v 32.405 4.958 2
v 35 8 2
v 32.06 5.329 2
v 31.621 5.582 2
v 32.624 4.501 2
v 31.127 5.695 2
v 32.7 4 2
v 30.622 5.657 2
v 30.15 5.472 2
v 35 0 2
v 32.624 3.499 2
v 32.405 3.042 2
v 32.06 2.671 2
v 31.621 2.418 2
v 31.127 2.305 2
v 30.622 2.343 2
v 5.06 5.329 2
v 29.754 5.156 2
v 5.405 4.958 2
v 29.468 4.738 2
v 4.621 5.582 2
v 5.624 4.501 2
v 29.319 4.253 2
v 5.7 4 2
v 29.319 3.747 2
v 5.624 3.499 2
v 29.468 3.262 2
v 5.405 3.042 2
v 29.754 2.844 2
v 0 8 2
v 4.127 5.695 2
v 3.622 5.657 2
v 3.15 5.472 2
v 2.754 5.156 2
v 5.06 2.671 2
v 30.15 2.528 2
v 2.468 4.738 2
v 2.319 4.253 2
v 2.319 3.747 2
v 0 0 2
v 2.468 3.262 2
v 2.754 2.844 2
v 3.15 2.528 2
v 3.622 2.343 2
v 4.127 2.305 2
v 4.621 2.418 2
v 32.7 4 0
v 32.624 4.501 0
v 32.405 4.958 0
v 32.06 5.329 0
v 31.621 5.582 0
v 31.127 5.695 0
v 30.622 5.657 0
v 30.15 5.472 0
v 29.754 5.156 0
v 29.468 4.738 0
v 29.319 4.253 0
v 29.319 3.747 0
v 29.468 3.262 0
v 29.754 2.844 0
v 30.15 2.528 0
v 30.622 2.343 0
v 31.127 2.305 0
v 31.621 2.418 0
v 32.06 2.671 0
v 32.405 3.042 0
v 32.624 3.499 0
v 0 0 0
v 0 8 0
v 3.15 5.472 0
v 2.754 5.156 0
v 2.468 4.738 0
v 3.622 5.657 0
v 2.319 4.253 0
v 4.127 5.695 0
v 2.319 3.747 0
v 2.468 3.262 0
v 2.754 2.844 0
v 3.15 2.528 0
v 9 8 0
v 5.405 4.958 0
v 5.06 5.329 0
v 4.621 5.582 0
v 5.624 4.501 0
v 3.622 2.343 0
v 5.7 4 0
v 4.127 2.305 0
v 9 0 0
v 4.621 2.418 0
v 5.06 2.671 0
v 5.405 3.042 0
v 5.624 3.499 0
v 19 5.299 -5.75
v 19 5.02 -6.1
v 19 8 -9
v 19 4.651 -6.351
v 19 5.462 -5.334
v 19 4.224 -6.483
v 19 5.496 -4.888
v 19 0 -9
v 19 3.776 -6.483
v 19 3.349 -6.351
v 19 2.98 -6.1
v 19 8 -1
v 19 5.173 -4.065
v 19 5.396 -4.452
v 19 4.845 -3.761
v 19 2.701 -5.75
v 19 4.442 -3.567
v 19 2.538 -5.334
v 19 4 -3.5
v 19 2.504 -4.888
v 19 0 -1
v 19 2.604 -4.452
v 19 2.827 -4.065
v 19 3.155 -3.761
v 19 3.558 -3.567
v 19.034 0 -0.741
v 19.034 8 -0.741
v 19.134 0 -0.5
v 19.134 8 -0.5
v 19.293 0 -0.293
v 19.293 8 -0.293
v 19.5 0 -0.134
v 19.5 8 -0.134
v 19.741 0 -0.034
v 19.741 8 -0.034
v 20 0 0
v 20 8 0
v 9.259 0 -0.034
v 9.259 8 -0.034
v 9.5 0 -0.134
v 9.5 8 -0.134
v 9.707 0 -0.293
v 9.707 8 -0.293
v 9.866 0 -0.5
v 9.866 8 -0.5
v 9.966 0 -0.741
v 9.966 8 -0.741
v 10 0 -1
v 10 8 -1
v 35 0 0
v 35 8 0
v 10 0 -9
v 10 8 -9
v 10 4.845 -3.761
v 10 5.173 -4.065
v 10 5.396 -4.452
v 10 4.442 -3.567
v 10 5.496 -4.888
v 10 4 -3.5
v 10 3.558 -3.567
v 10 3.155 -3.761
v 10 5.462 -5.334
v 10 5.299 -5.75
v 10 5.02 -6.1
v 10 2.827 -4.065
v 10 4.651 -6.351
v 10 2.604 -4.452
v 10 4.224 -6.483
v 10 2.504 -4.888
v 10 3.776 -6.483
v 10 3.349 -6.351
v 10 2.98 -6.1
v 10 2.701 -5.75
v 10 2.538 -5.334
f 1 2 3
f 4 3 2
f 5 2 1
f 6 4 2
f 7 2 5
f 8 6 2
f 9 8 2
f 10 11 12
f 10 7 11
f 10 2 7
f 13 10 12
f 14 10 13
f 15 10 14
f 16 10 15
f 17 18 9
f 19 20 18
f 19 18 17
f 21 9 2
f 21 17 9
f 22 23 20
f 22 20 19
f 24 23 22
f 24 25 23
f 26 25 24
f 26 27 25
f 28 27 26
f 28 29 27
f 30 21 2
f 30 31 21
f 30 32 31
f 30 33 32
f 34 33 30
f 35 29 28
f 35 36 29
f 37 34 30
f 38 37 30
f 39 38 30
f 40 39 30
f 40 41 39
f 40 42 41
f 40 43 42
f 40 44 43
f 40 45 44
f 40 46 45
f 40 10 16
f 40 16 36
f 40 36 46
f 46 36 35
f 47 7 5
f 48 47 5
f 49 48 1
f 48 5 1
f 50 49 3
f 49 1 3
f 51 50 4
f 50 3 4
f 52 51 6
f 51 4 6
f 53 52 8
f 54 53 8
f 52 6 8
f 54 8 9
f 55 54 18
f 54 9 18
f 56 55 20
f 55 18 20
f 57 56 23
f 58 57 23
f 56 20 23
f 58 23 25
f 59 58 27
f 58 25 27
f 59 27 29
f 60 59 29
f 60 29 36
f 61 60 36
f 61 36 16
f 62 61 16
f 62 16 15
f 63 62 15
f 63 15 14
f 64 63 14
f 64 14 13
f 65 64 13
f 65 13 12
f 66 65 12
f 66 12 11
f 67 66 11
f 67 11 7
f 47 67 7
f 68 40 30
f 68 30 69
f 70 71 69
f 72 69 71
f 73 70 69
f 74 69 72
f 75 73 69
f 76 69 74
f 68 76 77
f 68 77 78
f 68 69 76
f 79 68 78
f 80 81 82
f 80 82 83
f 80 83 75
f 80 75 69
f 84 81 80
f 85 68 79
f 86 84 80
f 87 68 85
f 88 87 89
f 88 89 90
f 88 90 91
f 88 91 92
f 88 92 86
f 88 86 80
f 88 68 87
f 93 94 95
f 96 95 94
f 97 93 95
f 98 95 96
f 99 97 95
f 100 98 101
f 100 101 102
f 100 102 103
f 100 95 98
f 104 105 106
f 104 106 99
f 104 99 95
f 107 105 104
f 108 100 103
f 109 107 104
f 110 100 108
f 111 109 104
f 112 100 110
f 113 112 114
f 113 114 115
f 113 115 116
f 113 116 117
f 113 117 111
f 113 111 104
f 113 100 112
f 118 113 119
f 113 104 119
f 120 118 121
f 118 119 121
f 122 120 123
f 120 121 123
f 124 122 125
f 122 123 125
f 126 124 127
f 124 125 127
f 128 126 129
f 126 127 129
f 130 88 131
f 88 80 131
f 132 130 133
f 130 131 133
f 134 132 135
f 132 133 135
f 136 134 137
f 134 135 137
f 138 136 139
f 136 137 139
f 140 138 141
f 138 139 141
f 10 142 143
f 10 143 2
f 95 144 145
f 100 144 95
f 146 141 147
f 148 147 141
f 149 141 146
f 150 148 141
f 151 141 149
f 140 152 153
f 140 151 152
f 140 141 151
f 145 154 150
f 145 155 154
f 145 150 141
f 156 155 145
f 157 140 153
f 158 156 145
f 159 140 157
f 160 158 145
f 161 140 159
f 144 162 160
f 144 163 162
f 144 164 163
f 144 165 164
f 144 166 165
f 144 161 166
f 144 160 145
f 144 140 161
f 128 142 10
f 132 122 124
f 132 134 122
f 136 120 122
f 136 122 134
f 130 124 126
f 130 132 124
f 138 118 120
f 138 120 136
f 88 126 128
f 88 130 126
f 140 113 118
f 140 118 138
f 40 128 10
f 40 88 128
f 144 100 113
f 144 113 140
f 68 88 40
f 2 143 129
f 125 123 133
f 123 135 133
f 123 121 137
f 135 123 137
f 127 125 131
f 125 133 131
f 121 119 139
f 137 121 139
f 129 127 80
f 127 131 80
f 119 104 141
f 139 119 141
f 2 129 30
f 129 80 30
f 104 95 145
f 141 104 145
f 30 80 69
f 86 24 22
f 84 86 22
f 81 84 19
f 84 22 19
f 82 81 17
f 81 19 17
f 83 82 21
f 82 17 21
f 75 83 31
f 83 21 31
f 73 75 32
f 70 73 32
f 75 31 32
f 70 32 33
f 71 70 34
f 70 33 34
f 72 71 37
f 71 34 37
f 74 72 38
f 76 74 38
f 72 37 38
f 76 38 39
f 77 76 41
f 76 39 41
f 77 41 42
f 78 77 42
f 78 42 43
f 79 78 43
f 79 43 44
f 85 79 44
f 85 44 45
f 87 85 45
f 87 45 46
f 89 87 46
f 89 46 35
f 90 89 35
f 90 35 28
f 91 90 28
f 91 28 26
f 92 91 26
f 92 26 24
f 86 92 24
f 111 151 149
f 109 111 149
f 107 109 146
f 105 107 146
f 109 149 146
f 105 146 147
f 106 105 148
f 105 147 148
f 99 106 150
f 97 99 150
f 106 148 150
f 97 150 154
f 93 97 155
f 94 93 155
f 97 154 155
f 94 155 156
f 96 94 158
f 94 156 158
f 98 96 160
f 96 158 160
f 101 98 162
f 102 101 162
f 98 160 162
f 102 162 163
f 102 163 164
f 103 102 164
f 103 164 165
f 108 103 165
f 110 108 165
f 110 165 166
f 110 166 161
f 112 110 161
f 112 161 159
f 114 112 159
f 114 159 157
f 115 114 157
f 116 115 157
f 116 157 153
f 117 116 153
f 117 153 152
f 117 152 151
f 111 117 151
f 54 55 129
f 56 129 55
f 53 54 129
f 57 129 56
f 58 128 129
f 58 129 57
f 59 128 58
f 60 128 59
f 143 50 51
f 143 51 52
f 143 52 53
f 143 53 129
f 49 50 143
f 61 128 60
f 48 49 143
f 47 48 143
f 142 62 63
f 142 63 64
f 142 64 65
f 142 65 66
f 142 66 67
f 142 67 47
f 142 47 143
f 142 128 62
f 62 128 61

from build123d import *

# Parameters (mm, degrees)
BOSS_EXTRUDE1_DEPTH      = 8
M3_CLEARANCE_HOLE1_D     = 3.4
M3_CLEARANCE_HOLE1_DEPTH = 3.9
M3_CLEARANCE_HOLE1_TIP   = 1.021463052
SKETCH4_R                = 1.5
CUT_EXTRUDE1_DEPTH       = 26
FILLET1_R                = 1


with BuildPart() as part:
    # Sketch1 → Boss-Extrude1 (new body)
    with BuildSketch(Plane(origin=(0, 0, 0), x_dir=(1, 0, 0), z_dir=(0, 1, 0))):
        Polygon((0, 0), (10, 0), (10, 9), (19, 9), (19, 0), (35, 0), (35, -2), (0, -2), align=None)
    extrude(amount=BOSS_EXTRUDE1_DEPTH)

    # M3 Clearance Hole1
    with Locations(Plane(origin=(0, 0, 0), x_dir=(-1, 0, 0), z_dir=(0, 0, -1))):
        with Locations((-4, 4), (-31, 4)):
            Hole(M3_CLEARANCE_HOLE1_D / 2, depth=M3_CLEARANCE_HOLE1_DEPTH)
            with Locations((0, 0, -(M3_CLEARANCE_HOLE1_DEPTH + M3_CLEARANCE_HOLE1_TIP / 2))):  # 118° drill point
                Cone(0, M3_CLEARANCE_HOLE1_D / 2, M3_CLEARANCE_HOLE1_TIP, mode=Mode.SUBTRACT)

    # Sketch4 → Cut-Extrude1 (cut, through all)
    with BuildSketch(Plane.ZY.offset(-10)):
        with Locations((-5, 4)):
            Circle(SKETCH4_R)
    extrude(amount=-CUT_EXTRUDE1_DEPTH, mode=Mode.SUBTRACT)

    # Fillet1
    fillet1_edges = [part.edges().sort_by_distance(p)[0] for p in [
        (19, 4, 0),
        (10, 4, 0),
    ]]
    fillet(fillet1_edges, radius=FILLET1_R)


solid = part.part
